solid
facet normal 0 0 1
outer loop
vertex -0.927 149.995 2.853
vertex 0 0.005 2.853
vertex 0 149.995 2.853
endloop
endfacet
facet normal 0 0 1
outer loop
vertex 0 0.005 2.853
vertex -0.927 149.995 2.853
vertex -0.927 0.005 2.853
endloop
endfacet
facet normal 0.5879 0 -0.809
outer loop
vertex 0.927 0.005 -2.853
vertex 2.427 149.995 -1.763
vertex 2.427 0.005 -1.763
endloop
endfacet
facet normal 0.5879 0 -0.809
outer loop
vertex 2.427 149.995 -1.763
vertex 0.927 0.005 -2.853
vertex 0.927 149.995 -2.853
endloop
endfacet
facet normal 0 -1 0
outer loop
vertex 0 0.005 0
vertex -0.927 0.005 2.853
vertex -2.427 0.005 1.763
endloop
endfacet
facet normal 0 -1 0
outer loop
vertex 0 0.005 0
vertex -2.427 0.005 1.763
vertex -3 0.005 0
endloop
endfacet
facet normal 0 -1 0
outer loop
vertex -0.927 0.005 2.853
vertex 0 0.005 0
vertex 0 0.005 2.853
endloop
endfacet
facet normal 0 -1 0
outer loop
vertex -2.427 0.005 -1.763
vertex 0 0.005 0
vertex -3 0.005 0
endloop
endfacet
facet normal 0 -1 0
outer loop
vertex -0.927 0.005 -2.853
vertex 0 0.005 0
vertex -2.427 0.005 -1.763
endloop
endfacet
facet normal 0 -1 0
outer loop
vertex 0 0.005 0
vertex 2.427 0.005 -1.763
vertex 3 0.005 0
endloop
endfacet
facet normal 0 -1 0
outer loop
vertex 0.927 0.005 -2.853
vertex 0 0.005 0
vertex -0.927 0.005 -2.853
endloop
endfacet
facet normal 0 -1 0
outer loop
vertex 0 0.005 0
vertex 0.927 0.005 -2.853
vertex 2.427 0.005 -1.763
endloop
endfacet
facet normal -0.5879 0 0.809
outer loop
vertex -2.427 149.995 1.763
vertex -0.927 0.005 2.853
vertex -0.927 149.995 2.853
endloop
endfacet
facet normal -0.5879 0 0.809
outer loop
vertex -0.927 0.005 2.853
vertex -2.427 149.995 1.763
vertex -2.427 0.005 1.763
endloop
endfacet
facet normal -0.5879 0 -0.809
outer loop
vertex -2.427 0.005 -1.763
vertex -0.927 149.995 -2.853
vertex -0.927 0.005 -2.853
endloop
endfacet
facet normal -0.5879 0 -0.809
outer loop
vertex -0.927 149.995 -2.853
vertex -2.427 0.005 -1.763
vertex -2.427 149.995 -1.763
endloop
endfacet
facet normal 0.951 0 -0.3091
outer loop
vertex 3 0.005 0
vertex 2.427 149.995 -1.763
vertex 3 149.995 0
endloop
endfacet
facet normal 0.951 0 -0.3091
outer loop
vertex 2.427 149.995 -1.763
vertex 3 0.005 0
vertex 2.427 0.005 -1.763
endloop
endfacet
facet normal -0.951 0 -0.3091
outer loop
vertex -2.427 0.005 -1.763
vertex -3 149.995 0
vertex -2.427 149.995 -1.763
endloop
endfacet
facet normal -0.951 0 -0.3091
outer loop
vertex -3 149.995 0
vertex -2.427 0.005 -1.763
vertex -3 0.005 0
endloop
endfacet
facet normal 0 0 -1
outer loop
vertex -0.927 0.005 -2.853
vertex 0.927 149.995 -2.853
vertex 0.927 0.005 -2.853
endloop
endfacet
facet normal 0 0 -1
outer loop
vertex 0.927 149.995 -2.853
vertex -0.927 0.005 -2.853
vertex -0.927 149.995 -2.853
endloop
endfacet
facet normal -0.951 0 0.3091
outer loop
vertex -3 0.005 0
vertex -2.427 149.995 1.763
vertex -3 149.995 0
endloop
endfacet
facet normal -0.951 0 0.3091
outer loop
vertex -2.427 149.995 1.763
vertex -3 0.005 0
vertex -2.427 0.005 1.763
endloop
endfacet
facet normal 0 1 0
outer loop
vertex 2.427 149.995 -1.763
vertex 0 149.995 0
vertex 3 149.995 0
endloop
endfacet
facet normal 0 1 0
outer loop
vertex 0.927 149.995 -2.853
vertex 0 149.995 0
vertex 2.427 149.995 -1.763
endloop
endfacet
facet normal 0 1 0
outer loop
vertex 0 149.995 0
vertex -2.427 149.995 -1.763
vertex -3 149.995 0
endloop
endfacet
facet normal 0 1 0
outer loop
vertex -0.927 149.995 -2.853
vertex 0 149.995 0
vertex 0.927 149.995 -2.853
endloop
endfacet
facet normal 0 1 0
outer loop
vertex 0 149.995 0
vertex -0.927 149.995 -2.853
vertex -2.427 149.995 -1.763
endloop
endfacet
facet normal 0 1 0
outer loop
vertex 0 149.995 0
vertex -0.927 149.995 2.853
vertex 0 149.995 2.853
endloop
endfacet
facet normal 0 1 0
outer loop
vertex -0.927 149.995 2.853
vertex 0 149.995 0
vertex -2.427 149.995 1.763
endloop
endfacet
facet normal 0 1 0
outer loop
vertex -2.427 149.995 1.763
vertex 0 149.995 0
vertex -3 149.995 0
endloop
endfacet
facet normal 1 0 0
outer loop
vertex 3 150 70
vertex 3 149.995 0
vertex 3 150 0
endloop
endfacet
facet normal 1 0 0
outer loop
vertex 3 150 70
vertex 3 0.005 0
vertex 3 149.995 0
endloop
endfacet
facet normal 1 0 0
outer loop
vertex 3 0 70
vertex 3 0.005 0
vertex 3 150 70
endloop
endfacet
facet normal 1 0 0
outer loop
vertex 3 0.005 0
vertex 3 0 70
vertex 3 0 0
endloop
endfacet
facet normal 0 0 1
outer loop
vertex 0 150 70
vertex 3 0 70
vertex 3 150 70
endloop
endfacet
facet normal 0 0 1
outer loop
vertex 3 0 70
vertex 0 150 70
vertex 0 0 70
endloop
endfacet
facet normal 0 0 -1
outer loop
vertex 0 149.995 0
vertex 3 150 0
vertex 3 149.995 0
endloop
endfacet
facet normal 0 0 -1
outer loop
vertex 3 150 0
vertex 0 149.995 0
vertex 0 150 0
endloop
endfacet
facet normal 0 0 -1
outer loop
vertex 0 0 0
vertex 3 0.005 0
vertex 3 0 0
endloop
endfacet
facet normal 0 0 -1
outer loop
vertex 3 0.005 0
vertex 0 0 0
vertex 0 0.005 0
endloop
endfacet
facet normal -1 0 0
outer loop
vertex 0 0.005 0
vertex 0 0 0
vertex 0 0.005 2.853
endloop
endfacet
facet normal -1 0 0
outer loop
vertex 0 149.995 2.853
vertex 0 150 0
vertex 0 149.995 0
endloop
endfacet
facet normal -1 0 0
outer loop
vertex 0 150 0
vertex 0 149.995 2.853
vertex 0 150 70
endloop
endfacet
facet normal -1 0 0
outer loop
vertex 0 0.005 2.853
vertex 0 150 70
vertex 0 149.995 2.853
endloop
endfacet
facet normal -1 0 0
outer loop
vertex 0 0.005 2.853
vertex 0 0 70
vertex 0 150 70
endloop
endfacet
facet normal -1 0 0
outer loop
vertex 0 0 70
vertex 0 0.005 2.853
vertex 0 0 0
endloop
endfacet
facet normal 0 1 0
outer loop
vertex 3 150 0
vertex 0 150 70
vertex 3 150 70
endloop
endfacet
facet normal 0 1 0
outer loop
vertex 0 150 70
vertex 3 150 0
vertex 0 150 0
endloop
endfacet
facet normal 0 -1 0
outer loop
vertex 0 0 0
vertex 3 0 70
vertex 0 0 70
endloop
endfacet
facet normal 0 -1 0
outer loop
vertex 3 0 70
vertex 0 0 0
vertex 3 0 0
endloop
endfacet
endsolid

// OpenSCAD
t = 3;
w = 150;
h = 70;
l = 1;
// Radius of bead along joints
bead = l * t;
// Radius of front bead along joints
bead2 = t/4 * t;
// epsilon to prevent problems with coincident planes
eps = 0.01;
 union() {
     translate([0,w/2,0]) rotate([90,0,0]) cylinder(h=w-eps,r=bead,center=true); 
    // translate([t/2,w/2,h]) rotate([90,0,0]) cylinder(h=w-eps,r=bead2,center=true); 
cube([t,w,h]);
 }
